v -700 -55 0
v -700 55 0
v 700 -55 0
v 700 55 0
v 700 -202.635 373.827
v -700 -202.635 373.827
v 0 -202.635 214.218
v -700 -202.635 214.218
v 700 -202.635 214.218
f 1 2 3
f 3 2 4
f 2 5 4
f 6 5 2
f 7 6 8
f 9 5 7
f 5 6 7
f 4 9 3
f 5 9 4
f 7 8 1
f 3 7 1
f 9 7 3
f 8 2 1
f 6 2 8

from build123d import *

# Parameters (mm, degrees)
SKETCH1_W          = 1400
SKETCH1_H          = 110
SKETCH3_W          = 241.229259038
SKETCH3_H          = 118.473208867
CUT_EXTRUDE1_DEPTH = 3000
SKETCH4_W          = 263.080499957
SKETCH4_H          = 130.335311081
CUT_EXTRUDE2_DEPTH = 1000


with BuildPart() as part:
    # Sweep2: sweep along a path in Sketch2
    with BuildLine(Plane(origin=(0, 0, 0), x_dir=(0, 0, -1), z_dir=(1, 0, 0))) as sweep2_path:
        Line((0, -52.72397822), (-373.826634648, -310.359400666))
    # Sketch1 → Sweep2 (sweep)
    with BuildSketch(Plane.XY):
        Rectangle(SKETCH1_W, SKETCH1_H)
    sweep(path=sweep2_path.line)

    # Sketch3 → Cut-Extrude1 (cut)
    with BuildSketch(Plane(origin=(0, 0, 0), x_dir=(0, 0, -1), z_dir=(1, 0, 0))):
        with Locations((-253.212005129, -261.87202688)):
            Rectangle(SKETCH3_W, SKETCH3_H)
    extrude(amount=CUT_EXTRUDE1_DEPTH, mode=Mode.SUBTRACT)

    # Sketch4 → Cut-Extrude2 (cut)
    with BuildSketch(Plane(origin=(0, 0, 0), x_dir=(0, 0, -1), z_dir=(1, 0, 0))):
        with Locations((-242.28638467, -267.803077986)):
            Rectangle(SKETCH4_W, SKETCH4_H)
    extrude(amount=-CUT_EXTRUDE2_DEPTH, mode=Mode.SUBTRACT)


solid = part.part
